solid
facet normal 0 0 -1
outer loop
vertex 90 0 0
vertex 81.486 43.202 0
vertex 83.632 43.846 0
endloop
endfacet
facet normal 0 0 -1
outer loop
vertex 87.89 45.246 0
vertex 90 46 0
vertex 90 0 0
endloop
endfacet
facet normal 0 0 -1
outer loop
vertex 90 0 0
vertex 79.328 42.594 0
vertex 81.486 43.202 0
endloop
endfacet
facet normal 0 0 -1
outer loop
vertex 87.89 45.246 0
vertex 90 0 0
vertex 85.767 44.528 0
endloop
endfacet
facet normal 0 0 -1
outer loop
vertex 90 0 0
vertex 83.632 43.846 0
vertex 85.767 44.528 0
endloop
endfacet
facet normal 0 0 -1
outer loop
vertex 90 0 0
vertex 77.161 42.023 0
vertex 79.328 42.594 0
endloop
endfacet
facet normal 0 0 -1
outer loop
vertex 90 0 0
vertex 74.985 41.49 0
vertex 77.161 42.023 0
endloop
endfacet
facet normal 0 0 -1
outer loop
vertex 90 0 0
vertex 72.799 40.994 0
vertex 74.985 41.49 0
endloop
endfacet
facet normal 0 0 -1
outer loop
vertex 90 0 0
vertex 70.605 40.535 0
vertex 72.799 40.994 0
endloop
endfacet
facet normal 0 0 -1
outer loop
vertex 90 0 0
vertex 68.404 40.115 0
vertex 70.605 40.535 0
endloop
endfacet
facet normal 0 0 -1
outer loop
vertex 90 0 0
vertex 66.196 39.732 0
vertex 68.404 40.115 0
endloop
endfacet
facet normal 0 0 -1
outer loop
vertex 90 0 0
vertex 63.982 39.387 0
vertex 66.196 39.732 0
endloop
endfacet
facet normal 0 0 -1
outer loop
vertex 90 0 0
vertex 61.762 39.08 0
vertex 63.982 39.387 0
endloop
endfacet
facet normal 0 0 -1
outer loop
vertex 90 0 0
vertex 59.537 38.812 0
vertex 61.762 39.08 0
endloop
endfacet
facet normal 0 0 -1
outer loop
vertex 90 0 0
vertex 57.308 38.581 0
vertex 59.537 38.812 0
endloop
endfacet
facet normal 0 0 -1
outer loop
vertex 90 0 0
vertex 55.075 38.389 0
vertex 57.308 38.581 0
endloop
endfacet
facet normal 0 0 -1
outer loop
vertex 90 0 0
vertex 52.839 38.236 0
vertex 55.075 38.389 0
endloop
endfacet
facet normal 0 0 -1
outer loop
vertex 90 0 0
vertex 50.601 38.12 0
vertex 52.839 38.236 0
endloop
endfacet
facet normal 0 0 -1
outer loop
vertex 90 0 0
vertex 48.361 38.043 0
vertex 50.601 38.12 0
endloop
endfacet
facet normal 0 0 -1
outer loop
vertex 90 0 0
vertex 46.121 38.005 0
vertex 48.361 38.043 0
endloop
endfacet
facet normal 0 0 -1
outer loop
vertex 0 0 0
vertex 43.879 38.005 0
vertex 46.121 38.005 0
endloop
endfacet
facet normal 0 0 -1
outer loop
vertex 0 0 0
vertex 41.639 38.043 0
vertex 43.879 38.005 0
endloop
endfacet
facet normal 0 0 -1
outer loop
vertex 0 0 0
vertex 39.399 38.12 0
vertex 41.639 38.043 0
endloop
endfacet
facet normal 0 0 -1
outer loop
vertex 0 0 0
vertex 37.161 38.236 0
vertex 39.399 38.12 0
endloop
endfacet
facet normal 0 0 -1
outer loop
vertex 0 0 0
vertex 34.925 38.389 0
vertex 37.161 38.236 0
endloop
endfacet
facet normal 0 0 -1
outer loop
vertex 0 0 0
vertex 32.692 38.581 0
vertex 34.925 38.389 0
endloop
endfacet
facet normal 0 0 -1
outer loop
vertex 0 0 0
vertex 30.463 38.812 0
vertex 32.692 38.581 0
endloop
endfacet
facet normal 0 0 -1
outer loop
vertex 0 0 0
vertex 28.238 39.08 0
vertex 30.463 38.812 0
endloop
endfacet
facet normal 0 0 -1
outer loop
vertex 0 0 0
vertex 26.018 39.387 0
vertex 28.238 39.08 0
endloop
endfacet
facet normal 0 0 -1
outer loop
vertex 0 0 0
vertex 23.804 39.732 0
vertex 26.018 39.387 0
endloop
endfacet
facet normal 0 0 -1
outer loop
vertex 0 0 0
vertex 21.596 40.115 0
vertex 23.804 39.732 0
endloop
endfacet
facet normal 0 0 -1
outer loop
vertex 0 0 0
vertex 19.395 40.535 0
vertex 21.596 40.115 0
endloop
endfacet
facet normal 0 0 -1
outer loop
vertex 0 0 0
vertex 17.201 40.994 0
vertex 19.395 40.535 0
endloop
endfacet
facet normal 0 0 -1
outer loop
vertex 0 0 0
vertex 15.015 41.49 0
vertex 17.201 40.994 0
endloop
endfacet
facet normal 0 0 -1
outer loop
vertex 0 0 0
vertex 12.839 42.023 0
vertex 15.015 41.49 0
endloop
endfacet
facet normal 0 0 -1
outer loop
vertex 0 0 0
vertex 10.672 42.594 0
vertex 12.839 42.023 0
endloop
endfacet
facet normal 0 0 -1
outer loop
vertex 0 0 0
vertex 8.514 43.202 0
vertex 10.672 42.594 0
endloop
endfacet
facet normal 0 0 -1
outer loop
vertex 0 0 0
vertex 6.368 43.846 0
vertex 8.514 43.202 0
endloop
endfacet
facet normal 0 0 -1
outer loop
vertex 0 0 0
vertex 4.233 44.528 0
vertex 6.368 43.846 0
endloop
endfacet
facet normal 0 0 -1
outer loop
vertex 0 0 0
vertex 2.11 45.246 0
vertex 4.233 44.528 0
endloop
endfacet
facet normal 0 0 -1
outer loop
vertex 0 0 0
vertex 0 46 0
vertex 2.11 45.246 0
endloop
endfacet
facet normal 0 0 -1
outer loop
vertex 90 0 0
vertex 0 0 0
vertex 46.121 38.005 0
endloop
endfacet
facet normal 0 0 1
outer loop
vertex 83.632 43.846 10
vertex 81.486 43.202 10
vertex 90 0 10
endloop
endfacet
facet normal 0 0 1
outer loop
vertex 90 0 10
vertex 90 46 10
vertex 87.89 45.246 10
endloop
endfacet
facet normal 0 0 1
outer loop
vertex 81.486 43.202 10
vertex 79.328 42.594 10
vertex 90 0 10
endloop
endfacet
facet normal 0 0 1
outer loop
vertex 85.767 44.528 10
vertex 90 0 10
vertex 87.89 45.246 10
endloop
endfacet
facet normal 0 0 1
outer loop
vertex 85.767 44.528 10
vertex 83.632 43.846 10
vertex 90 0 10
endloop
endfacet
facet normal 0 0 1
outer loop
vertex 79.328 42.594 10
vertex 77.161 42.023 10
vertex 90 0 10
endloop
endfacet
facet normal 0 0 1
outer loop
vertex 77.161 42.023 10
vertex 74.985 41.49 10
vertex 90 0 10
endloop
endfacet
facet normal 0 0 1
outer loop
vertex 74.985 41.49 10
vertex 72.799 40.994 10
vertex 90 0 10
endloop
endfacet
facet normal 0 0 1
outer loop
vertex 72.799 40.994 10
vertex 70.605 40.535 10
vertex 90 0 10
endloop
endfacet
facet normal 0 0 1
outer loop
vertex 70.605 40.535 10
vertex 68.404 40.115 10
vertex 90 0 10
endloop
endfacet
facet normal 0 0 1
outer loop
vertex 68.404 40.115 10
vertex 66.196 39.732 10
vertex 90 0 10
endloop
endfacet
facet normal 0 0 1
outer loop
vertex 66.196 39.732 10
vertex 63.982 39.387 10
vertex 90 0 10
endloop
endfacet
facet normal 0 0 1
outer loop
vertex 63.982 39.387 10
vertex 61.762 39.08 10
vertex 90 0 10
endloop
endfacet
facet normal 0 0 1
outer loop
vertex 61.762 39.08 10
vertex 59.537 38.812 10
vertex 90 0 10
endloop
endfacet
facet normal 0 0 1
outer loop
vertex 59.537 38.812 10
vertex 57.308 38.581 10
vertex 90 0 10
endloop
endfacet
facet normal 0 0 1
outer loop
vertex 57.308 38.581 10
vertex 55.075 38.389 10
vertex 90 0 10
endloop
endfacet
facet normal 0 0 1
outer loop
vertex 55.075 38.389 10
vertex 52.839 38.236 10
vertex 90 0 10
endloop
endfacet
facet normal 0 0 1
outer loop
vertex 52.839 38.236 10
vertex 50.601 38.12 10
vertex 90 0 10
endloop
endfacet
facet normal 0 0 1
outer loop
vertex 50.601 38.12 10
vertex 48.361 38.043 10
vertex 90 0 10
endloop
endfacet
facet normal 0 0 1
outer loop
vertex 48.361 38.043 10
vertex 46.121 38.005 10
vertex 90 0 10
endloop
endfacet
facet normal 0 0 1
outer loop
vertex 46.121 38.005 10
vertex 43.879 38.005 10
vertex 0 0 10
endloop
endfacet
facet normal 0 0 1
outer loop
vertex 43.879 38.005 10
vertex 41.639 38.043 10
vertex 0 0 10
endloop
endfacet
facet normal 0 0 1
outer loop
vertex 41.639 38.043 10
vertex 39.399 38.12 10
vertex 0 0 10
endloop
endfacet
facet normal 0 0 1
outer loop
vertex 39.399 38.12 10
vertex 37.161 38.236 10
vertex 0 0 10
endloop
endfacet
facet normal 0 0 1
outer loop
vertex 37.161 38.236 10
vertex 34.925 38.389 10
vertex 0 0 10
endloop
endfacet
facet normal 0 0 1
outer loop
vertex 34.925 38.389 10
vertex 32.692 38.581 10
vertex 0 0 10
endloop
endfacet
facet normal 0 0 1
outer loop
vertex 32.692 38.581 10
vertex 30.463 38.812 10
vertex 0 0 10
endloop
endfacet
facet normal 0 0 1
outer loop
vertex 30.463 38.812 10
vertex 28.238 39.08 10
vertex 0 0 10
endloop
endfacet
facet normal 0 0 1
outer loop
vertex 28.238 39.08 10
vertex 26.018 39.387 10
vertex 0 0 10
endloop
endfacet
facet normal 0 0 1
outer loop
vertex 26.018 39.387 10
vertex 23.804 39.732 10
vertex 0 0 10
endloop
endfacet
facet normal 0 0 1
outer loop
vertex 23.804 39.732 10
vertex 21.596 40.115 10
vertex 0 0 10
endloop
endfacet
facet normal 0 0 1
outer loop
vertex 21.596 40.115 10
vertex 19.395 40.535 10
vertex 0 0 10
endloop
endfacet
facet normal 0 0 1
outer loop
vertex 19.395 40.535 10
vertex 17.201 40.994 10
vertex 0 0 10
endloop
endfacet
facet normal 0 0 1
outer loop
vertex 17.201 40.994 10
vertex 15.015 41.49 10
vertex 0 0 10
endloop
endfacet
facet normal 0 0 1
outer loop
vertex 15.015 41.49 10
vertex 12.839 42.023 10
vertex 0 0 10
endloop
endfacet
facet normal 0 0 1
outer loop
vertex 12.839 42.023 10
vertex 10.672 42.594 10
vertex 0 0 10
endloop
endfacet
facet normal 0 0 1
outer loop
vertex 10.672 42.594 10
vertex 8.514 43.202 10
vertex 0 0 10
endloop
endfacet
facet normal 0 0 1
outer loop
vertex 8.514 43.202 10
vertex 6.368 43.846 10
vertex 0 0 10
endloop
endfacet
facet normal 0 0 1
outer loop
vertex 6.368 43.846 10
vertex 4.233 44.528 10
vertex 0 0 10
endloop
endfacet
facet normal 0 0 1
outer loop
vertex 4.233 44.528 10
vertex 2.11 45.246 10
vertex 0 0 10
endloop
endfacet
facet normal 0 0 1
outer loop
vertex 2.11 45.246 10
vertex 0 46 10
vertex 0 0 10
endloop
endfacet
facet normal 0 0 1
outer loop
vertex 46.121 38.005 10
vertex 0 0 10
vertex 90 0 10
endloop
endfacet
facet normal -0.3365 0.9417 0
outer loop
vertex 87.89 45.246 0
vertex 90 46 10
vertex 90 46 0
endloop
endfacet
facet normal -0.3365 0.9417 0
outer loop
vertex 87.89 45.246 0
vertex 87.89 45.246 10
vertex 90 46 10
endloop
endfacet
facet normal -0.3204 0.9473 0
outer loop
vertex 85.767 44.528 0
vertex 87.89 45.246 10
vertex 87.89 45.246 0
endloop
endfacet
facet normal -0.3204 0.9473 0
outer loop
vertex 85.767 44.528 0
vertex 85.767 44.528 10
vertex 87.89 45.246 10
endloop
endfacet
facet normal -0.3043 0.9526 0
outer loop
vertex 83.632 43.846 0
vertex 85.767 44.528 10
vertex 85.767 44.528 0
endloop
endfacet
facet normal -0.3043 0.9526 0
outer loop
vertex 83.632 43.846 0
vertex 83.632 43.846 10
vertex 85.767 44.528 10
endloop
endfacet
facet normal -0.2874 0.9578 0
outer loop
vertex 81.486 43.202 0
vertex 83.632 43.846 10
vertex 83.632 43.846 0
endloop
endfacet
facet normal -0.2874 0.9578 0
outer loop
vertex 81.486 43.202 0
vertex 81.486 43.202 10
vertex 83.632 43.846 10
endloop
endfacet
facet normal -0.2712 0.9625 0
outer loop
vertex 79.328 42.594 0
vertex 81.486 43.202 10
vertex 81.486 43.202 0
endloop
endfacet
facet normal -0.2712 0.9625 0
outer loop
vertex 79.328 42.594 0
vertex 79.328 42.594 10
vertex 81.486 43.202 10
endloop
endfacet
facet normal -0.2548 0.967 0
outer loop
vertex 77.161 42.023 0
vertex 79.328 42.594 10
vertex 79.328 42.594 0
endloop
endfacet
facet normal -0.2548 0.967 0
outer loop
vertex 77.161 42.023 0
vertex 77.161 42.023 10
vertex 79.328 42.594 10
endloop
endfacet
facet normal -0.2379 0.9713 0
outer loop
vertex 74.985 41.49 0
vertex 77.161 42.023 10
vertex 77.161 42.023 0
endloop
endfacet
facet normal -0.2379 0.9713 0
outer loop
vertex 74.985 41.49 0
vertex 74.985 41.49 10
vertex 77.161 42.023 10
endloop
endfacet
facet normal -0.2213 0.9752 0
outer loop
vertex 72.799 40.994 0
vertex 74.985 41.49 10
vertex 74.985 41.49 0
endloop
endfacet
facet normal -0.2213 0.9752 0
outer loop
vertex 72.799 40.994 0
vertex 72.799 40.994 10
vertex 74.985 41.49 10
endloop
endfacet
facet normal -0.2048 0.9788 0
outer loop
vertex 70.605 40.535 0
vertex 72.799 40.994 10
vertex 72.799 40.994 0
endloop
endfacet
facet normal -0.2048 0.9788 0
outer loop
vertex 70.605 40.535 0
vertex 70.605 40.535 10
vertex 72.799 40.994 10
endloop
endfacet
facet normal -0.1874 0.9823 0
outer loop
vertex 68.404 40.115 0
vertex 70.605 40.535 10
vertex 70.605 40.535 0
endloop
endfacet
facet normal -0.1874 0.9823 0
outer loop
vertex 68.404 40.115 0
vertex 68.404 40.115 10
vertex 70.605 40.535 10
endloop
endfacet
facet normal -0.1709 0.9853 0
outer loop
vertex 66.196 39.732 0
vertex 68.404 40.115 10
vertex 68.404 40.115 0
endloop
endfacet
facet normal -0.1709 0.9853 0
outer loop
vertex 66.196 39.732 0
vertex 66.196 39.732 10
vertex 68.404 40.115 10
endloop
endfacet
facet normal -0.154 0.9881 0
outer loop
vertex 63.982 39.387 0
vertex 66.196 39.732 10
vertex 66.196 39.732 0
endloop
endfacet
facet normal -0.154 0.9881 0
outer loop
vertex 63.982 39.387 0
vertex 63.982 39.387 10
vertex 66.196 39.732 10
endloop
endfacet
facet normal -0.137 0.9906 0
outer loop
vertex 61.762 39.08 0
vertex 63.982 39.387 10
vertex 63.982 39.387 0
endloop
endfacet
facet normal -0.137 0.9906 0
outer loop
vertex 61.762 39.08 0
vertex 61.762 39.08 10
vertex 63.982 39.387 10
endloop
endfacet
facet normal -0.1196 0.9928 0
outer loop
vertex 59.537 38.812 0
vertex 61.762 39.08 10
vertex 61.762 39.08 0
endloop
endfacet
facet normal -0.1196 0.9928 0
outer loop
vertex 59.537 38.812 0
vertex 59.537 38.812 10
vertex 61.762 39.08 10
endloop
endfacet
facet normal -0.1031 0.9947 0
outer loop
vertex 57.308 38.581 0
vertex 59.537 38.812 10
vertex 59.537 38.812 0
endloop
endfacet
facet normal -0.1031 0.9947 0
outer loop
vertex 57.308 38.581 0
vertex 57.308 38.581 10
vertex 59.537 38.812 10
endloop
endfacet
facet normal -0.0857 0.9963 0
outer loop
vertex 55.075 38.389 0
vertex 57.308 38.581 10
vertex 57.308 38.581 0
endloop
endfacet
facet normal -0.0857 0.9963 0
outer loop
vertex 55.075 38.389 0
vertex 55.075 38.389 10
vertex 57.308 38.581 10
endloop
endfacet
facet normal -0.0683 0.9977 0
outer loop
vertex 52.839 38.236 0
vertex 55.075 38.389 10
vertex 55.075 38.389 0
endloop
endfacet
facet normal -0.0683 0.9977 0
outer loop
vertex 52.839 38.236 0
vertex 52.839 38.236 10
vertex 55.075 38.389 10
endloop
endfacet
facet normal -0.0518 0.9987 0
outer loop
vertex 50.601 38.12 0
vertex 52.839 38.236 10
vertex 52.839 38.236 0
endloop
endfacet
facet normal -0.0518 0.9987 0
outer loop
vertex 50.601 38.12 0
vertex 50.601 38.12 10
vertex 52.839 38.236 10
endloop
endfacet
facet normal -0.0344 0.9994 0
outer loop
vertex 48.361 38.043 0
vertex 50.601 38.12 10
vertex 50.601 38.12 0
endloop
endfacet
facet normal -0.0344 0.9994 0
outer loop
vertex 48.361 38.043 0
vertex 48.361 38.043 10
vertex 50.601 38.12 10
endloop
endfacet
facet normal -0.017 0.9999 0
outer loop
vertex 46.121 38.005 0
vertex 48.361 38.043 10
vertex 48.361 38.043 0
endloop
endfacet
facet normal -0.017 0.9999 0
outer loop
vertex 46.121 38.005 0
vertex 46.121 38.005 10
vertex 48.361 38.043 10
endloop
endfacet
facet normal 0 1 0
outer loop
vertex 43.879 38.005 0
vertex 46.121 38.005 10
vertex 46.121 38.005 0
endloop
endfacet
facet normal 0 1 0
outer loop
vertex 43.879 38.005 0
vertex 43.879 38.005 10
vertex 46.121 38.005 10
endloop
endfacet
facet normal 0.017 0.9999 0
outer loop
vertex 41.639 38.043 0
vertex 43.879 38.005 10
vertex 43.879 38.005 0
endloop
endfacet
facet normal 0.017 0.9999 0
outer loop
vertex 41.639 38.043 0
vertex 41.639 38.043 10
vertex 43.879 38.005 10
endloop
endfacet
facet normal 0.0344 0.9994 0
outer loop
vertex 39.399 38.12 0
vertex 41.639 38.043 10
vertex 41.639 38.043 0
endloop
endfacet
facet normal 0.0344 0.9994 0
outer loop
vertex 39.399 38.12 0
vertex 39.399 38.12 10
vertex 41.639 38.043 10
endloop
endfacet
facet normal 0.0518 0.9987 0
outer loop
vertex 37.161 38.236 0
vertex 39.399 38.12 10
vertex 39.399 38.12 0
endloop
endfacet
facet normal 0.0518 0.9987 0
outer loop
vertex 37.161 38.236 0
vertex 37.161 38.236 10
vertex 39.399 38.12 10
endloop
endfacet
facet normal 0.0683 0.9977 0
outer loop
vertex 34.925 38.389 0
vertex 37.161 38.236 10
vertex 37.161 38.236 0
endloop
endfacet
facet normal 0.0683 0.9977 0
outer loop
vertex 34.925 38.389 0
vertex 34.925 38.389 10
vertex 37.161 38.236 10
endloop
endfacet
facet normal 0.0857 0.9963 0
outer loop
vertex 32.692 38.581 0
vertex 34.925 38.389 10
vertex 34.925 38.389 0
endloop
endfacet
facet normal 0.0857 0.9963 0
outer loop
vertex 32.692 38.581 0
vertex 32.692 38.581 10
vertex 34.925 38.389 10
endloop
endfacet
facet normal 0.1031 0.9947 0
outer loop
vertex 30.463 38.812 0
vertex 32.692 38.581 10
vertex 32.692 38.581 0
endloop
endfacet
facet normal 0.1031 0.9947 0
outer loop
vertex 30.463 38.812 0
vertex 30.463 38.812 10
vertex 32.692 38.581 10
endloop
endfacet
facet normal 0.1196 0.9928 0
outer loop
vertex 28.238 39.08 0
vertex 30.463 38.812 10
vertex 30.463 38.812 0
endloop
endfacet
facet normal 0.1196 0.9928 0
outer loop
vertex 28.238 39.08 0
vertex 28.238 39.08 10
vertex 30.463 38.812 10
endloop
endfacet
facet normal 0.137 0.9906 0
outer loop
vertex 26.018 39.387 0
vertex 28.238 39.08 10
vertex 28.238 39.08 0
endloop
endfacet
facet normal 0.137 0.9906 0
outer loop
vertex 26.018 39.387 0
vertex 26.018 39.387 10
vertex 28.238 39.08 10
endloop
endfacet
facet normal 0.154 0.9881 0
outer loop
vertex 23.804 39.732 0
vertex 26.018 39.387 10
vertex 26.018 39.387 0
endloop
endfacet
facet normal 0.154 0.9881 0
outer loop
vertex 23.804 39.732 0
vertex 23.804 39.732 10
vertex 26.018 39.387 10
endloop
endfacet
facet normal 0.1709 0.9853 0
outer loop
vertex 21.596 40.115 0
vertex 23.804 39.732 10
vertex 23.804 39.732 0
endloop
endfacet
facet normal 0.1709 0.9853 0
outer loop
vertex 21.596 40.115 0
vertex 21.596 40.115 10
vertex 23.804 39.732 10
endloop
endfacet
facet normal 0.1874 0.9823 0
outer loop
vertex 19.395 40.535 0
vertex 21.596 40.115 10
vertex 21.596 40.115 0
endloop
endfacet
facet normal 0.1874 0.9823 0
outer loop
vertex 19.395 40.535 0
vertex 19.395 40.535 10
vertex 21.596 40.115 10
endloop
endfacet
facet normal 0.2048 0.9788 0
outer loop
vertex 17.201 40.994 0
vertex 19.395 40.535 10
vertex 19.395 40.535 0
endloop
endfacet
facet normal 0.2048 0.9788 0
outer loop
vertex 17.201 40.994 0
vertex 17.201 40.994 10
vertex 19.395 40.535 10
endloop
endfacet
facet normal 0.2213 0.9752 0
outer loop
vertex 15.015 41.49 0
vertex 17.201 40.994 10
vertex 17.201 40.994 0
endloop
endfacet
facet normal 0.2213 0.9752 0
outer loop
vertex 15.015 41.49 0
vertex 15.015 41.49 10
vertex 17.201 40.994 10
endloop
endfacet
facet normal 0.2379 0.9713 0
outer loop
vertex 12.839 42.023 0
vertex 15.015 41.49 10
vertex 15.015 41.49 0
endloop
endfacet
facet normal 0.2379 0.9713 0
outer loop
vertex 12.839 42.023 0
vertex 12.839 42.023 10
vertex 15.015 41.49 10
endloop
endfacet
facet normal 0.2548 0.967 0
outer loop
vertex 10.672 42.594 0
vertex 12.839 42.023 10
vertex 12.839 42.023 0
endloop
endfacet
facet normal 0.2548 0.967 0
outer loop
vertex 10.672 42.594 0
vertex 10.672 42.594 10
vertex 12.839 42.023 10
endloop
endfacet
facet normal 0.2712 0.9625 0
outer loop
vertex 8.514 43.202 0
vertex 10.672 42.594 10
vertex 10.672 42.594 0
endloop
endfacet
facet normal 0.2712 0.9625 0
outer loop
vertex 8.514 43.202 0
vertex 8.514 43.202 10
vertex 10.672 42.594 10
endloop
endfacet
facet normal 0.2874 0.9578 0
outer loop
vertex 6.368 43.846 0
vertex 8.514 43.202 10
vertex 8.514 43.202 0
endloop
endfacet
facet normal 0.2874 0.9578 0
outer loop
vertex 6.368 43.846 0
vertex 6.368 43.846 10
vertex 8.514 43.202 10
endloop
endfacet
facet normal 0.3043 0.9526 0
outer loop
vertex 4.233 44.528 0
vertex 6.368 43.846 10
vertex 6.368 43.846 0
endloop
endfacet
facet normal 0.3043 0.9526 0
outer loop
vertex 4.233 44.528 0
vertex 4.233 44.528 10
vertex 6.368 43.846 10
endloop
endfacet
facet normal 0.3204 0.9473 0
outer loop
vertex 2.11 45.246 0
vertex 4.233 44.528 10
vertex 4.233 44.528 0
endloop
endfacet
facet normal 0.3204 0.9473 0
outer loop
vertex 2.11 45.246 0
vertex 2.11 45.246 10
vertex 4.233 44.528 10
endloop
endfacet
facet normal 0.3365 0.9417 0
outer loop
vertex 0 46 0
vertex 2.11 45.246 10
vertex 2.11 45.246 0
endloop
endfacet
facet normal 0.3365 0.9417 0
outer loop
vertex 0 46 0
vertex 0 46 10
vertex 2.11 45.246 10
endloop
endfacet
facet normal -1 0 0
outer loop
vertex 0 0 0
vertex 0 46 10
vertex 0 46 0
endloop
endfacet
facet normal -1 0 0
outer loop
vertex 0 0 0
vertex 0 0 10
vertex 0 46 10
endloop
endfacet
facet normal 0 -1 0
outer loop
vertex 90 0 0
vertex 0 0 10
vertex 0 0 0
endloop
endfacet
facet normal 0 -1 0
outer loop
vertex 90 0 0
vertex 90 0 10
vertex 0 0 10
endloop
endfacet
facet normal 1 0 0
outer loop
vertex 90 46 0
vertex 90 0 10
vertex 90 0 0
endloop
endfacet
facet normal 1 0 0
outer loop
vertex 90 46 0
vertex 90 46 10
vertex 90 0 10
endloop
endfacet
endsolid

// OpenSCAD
$fn = 32;

// ----------------------------------------------------------------------
// Arc profile plate: notch, 44 points
// ----------------------------------------------------------------------

// --- parameters (mm) ---
bar_l = 90;               // bar length, X
bar_w = 46;               // bar width, Y
notch_depth = 8;          // depth of the arc notch at mid-span
arc_r = 130.56;           // radius of the notch arc
arc_angle = 40.32;        // notch arc angle, degrees
arc_step = 1;             // sampling step of the notch arc, degrees
plate_t = 10;             // plate thickness, Z

profile = [[0, 0], [90, 0], [90, 46], [87.89, 45.246], [85.767, 44.528], [83.632, 43.846], [81.486, 43.202], [79.328, 42.594], [77.161, 42.023], [74.985, 41.49], [72.799, 40.994], [70.605, 40.535], [68.404, 40.115], [66.196, 39.732], [63.982, 39.387], [61.762, 39.08], [59.537, 38.812], [57.308, 38.581], [55.075, 38.389], [52.839, 38.236], [50.601, 38.12], [48.361, 38.043], [46.121, 38.005], [43.879, 38.005], [41.639, 38.043], [39.399, 38.12], [37.161, 38.236], [34.925, 38.389], [32.692, 38.581], [30.463, 38.812], [28.238, 39.08], [26.018, 39.387], [23.804, 39.732], [21.596, 40.115], [19.395, 40.535], [17.201, 40.994], [15.015, 41.49], [12.839, 42.023], [10.672, 42.594], [8.514, 43.202], [6.368, 43.846], [4.233, 44.528], [2.11, 45.246], [0, 46]];  // primary outline, 44 points, counter clockwise

// --- the one profile operation ---
linear_extrude(height = plate_t) polygon(points = profile);
